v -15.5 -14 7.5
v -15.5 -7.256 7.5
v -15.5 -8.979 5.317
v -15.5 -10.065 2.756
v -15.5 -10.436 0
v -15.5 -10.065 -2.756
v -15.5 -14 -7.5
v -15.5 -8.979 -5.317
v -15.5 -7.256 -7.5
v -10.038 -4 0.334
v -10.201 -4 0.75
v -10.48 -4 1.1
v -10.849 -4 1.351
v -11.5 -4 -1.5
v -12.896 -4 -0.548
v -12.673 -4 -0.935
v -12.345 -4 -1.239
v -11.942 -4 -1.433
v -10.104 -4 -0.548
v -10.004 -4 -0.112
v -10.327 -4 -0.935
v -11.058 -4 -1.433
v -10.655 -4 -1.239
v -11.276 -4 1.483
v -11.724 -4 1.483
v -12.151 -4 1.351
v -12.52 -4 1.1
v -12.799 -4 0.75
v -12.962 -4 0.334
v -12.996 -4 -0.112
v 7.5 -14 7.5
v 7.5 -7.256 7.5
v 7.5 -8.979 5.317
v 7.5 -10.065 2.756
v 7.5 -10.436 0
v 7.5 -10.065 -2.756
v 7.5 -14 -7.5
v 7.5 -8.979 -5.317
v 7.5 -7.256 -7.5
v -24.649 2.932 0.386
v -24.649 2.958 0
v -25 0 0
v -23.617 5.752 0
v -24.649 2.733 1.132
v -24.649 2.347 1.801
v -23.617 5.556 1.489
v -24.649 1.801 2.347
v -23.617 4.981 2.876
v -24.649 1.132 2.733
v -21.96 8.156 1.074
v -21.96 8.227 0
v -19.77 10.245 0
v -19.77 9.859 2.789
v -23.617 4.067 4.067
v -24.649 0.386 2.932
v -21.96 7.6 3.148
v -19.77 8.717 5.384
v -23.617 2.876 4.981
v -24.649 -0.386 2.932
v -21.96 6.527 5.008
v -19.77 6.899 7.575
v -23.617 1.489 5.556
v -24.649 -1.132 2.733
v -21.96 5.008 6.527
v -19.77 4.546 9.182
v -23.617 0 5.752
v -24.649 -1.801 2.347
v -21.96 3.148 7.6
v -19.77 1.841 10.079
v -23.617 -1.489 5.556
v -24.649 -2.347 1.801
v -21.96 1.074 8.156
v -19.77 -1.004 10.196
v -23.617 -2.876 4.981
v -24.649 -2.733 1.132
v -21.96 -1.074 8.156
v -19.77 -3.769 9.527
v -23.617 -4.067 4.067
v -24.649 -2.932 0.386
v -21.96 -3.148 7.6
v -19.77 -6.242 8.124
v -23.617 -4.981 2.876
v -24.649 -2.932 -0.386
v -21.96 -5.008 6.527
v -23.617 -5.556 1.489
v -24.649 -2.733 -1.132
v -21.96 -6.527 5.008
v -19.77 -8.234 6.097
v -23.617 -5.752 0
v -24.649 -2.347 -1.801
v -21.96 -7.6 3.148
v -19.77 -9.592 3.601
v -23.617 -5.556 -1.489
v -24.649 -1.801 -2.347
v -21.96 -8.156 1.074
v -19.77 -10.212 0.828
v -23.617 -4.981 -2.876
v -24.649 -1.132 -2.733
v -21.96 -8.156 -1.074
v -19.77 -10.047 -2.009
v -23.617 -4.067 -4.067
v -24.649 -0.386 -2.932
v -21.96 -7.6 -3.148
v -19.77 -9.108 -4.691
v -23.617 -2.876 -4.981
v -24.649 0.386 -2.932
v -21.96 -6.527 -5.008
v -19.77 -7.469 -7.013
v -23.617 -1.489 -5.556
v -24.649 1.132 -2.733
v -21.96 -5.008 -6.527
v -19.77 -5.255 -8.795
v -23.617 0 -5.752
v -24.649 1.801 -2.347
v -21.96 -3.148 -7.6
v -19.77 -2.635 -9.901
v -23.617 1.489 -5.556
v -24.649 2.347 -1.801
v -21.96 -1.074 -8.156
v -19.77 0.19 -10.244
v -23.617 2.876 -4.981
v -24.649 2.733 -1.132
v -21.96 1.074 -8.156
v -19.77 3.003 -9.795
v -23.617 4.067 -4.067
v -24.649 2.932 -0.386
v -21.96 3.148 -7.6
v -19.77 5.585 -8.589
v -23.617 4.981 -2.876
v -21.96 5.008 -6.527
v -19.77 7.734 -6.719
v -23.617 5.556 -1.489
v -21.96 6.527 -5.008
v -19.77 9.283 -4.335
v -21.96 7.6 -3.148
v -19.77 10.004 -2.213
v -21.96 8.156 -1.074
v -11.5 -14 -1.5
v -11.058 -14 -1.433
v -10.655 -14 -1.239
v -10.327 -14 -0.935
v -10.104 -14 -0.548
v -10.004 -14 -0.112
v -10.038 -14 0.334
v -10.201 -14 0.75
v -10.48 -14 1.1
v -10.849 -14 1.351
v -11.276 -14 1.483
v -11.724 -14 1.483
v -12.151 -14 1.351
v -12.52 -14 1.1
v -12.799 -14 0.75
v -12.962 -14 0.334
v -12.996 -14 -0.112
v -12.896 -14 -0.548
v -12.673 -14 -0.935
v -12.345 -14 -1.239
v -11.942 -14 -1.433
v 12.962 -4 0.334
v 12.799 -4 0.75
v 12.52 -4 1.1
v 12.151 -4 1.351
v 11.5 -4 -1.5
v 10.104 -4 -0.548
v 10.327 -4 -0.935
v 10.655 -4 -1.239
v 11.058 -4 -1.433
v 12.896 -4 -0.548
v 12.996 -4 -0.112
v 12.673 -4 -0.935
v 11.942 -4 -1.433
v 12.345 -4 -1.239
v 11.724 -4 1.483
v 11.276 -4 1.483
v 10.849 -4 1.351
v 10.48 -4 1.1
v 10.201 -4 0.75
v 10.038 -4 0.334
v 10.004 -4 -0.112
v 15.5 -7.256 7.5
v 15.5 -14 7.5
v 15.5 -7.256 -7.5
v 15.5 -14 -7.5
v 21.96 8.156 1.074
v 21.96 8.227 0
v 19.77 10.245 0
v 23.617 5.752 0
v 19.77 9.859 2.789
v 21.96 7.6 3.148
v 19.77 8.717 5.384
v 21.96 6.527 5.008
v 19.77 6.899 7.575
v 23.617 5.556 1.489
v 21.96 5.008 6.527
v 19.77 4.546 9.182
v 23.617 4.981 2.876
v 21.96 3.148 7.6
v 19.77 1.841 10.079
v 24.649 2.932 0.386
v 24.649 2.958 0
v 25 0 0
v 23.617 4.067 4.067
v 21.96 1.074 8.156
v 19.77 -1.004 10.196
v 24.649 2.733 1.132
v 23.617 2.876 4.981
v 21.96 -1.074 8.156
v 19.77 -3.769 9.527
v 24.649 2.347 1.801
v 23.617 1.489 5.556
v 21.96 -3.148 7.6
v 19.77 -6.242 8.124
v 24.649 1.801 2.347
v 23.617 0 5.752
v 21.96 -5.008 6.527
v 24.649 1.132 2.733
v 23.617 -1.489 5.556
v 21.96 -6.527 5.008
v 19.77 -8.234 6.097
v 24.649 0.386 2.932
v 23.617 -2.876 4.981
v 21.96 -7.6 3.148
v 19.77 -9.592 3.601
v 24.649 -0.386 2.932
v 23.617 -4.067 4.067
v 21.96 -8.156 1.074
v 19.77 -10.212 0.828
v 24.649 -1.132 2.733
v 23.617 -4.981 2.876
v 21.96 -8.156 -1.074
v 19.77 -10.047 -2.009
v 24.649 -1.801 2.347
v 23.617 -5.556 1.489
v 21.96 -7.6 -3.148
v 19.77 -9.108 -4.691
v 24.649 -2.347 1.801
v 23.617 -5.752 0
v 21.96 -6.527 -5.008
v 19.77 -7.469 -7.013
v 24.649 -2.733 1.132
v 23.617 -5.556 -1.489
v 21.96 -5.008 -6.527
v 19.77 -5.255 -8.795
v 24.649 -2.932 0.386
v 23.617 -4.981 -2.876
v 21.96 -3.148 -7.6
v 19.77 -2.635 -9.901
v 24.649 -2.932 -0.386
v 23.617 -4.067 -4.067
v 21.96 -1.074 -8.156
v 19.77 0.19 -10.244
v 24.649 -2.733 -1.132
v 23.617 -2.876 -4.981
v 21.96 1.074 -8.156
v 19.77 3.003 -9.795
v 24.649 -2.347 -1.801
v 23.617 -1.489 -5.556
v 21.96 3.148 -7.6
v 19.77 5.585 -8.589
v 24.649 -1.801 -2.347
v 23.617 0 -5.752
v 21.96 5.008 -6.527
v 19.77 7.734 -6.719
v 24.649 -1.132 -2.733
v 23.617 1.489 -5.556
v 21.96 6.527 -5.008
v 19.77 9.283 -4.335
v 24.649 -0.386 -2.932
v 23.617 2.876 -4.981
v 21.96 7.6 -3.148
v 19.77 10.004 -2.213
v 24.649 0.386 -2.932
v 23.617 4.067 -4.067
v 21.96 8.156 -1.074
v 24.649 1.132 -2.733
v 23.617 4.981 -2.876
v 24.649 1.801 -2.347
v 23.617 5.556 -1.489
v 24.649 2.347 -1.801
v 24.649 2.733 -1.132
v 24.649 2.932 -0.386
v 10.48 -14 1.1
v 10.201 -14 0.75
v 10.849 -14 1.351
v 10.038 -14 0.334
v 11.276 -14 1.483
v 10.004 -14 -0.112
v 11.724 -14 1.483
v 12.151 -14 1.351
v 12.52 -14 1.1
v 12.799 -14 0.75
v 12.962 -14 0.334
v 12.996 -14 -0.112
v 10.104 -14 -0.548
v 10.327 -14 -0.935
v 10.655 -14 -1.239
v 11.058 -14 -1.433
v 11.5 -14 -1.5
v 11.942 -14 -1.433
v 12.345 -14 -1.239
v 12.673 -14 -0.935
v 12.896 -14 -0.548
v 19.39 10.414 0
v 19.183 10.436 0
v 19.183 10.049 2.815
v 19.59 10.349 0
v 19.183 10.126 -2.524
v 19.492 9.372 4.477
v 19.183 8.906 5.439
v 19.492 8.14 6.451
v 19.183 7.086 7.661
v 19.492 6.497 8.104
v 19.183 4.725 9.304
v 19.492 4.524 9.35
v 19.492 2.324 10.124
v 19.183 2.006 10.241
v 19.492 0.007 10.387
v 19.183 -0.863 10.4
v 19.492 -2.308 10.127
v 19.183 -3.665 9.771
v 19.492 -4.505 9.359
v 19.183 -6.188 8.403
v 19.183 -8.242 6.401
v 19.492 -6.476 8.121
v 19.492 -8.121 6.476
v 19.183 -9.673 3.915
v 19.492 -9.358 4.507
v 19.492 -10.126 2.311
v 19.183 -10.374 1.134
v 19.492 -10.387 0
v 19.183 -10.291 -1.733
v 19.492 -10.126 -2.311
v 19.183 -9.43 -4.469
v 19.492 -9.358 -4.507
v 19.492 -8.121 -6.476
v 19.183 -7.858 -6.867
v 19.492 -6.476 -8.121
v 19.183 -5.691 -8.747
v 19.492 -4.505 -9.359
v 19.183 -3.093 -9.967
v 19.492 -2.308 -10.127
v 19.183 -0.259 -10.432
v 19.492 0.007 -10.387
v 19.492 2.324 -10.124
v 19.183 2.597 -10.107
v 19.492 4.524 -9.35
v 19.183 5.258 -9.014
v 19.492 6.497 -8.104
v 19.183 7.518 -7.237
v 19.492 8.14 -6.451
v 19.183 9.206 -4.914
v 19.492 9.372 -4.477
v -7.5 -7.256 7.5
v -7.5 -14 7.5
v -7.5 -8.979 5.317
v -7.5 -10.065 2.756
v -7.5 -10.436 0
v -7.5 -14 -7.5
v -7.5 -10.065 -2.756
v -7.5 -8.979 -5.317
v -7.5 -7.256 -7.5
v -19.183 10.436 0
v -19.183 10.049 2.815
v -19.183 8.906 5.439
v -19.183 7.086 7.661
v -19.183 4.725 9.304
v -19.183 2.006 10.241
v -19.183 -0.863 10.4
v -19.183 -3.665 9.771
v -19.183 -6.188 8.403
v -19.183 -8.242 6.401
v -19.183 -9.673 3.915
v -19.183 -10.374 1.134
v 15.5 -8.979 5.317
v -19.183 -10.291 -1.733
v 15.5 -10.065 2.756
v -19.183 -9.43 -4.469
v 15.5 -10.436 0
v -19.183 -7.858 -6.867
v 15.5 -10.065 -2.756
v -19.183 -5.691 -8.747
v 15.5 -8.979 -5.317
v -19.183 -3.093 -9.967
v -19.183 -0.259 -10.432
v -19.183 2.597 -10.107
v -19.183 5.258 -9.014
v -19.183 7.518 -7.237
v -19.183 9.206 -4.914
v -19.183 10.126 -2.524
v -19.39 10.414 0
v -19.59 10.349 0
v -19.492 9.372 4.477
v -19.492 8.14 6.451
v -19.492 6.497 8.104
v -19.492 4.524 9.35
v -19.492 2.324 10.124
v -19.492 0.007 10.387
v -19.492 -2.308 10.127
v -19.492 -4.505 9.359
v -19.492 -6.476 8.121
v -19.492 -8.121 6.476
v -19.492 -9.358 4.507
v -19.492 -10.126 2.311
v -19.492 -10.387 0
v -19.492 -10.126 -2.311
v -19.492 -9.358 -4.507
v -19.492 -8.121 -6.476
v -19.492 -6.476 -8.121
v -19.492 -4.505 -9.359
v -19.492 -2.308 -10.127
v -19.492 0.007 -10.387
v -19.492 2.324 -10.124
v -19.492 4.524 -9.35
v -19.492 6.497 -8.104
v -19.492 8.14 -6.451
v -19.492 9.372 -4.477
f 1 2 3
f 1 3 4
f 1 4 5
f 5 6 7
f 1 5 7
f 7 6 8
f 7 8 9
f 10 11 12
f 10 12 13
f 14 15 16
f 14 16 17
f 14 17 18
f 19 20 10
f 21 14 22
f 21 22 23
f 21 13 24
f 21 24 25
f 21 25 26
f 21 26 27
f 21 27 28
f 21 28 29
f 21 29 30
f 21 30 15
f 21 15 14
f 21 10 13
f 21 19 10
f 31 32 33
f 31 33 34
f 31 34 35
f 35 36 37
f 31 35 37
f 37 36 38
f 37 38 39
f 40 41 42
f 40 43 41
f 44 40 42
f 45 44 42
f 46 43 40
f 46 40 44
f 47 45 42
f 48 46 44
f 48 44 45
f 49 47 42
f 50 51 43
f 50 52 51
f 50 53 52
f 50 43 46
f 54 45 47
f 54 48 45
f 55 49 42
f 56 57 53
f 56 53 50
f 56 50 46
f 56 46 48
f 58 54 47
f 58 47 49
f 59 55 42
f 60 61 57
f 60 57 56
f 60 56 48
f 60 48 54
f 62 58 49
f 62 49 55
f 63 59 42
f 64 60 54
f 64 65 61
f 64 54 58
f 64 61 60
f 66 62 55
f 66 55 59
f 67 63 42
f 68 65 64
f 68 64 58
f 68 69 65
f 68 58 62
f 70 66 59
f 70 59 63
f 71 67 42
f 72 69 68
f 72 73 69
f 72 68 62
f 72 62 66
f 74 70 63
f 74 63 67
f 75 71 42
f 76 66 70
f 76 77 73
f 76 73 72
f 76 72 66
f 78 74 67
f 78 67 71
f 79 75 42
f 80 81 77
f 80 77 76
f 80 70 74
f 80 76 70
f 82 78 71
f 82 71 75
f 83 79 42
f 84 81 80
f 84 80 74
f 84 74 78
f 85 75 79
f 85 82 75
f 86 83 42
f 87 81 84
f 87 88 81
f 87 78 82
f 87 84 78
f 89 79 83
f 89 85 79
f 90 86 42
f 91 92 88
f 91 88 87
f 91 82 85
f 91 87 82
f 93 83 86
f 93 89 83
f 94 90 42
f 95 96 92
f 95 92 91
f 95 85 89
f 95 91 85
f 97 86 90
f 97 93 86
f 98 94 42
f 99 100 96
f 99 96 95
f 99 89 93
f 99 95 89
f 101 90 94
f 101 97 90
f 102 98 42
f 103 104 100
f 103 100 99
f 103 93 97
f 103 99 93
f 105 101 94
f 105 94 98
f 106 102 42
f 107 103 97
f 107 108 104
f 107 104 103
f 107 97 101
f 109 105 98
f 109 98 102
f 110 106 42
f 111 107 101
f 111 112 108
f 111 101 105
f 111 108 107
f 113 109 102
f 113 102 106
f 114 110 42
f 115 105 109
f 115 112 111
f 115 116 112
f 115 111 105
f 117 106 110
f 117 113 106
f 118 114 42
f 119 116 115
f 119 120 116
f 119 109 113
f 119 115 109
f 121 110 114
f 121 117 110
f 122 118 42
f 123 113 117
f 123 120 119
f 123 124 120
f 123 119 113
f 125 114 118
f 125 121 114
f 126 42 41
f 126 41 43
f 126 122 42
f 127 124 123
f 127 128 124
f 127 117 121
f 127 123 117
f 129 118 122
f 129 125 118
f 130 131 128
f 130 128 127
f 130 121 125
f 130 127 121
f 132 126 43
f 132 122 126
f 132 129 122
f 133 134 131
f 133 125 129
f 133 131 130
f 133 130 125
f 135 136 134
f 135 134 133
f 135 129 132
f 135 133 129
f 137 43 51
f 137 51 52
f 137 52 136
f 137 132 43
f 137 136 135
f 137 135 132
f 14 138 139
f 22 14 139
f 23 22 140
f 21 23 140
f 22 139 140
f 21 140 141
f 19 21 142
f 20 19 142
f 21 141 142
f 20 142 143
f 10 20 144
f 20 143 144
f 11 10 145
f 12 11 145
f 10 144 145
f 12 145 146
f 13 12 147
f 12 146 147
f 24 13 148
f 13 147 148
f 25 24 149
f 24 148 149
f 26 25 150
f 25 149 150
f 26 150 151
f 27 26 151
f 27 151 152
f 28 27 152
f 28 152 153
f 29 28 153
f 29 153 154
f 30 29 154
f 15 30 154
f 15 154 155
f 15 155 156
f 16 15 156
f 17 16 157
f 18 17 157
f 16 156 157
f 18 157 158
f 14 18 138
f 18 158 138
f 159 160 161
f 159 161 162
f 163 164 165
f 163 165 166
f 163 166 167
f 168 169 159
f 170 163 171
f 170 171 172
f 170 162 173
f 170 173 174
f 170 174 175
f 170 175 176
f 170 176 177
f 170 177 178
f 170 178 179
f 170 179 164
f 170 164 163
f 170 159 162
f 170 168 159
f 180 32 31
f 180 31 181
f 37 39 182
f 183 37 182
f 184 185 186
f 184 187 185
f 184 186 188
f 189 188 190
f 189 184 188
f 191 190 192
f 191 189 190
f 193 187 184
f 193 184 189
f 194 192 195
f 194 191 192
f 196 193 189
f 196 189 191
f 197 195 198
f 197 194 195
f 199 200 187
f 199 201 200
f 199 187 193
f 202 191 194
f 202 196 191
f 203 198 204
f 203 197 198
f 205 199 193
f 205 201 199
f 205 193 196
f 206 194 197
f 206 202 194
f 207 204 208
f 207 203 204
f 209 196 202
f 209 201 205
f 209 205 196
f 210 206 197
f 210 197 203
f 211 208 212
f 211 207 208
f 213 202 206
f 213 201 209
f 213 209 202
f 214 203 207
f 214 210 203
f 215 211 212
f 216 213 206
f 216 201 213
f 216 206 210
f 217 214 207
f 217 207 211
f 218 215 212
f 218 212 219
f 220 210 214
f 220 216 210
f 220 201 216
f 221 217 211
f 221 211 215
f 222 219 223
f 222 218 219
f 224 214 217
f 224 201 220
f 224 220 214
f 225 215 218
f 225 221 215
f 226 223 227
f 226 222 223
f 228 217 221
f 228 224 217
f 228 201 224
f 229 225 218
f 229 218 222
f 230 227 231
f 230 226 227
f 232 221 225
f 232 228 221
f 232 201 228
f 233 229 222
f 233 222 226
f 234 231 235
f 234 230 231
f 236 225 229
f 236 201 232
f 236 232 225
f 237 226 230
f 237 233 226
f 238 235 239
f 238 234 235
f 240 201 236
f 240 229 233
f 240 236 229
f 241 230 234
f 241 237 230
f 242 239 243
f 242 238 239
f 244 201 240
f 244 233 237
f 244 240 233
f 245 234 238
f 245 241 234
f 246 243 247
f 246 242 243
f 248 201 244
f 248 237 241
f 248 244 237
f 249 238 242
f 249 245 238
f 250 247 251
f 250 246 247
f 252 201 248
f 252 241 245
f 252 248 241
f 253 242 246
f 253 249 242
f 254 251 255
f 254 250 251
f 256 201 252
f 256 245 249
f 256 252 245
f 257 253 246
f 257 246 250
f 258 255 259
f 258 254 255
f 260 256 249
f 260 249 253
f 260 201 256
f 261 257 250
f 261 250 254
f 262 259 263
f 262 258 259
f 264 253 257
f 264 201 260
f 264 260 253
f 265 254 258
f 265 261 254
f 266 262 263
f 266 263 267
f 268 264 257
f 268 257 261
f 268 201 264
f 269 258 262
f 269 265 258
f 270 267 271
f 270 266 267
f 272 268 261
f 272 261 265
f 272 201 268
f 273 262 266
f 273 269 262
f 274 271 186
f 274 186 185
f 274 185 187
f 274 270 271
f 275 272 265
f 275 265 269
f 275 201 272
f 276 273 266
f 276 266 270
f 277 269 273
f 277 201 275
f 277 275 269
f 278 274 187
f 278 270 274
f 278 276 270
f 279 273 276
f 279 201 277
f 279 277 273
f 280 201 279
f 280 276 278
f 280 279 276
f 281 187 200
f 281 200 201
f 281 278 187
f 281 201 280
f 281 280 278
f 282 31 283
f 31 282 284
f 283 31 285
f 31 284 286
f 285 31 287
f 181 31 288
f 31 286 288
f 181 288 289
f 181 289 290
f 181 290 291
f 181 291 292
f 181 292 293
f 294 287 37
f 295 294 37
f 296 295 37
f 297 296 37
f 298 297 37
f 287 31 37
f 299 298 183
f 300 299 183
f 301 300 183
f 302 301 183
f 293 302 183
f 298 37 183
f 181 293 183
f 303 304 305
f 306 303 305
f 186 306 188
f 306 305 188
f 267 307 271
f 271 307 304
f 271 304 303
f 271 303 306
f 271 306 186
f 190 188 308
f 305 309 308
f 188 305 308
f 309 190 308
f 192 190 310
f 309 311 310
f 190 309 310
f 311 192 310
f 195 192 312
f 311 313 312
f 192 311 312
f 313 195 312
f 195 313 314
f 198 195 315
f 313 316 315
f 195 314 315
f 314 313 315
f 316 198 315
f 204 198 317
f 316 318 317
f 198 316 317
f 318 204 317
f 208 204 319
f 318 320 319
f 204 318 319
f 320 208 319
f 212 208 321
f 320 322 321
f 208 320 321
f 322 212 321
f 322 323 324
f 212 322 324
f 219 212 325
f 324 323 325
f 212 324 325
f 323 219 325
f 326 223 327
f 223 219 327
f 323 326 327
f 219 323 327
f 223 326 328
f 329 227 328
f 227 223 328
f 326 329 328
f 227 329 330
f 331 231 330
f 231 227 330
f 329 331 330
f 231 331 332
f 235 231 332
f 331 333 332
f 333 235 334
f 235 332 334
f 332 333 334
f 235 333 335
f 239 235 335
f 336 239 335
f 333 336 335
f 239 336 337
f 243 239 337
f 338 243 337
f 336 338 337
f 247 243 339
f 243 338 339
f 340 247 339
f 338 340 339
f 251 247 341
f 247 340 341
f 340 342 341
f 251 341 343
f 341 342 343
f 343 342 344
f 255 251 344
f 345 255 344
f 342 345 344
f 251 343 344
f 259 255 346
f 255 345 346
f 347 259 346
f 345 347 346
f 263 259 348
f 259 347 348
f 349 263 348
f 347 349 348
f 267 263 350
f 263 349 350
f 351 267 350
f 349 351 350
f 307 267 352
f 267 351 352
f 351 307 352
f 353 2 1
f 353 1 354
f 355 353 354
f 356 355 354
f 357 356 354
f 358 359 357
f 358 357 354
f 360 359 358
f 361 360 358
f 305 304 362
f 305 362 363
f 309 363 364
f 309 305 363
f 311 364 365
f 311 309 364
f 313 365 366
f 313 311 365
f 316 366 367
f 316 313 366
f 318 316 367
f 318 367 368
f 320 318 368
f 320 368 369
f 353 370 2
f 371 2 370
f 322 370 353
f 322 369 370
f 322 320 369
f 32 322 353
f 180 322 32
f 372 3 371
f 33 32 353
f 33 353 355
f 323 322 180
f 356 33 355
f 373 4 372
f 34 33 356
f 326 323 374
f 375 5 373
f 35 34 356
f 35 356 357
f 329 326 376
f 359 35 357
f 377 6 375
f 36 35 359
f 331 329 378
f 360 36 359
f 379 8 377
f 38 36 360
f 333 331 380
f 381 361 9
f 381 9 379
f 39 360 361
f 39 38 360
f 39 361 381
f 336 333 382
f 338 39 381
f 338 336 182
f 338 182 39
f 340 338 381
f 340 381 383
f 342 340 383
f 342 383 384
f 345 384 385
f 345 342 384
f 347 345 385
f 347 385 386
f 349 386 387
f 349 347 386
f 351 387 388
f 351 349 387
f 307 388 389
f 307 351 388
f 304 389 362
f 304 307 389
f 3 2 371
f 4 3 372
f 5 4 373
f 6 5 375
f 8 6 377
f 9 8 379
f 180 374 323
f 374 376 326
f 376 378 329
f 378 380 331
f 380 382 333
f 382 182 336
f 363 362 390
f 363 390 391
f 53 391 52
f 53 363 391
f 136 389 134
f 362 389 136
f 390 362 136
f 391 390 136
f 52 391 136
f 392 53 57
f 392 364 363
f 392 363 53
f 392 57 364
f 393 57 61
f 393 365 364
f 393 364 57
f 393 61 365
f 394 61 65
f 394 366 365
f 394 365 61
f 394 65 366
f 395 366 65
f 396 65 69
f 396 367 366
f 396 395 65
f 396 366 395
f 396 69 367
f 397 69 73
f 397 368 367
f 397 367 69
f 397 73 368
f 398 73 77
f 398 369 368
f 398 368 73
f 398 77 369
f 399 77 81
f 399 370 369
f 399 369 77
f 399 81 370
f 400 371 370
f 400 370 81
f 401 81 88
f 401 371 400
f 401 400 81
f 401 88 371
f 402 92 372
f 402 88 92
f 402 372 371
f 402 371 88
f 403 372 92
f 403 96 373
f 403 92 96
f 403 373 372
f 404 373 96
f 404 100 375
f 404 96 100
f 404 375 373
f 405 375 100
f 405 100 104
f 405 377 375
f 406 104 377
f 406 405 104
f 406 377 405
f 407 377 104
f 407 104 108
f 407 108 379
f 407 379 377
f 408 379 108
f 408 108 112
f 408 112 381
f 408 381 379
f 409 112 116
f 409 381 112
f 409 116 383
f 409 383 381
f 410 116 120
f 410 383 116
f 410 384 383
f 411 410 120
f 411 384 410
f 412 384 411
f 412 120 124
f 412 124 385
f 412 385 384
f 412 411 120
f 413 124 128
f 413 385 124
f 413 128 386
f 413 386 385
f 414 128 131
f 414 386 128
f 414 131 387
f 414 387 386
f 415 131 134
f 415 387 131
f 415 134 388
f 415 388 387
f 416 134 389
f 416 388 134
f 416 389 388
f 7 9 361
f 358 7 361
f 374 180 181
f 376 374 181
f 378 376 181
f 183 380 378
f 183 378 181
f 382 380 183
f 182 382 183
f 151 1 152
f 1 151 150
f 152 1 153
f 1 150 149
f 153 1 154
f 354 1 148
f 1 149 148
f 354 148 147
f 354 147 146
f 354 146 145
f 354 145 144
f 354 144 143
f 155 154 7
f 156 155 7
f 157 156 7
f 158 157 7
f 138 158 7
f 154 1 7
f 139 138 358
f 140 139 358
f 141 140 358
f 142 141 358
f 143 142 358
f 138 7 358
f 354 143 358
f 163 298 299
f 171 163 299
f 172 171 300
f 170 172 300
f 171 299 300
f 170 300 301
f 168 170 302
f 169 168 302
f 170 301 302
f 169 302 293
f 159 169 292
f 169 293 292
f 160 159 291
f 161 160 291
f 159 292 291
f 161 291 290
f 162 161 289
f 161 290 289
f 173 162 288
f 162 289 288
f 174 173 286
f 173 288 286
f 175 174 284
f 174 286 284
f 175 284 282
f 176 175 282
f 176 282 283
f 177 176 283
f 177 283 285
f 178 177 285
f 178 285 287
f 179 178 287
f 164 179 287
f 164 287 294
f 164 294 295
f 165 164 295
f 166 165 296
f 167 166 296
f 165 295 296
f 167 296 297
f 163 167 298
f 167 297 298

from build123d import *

# Parameters (mm, degrees)
SKETCH_3_W          = 8
SKETCH_3_H          = 15
EXTRUDE_1_DEPTH     = 14
SKETCH_4_R          = 1.5
CUT_EXTRUDE_1_DEPTH = 10
FILLET_1_R          = 1


with BuildPart() as part:
    # ｽｹｯﾁ1 → 回転2 (revolve)
    with BuildSketch(Plane.XY):
        with BuildLine():
            Line((-19.5, 10.435516279), (19.5, 10.435516279))
            ThreePointArc((19.5, 10.435516279), (23.540844472, 5.898092912), (25, 0))
            Line((25, 0), (-25, 0))
            ThreePointArc((-25, 0), (-23.540844472, 5.898092912), (-19.5, 10.435516279))
        make_face()
    revolve(axis=Axis((-19.5, 0, 0), (1, 0, 0)))

    # ｽｹｯﾁ3 → ﾎﾞｽ - 押し出し1 (add)
    with BuildSketch(Plane(origin=(0, 0, 0), x_dir=(1, 0, 0), z_dir=(0, 1, 0))):
        with Locations((-11.5, 0)):
            Rectangle(SKETCH_3_W, SKETCH_3_H)
        with Locations((11.5, 0)):
            Rectangle(SKETCH_3_W, SKETCH_3_H)
    extrude(amount=-EXTRUDE_1_DEPTH)

    # ｽｹｯﾁ4 → ｶｯﾄ - 押し出し1 (cut)
    with BuildSketch(Plane(origin=(0, -14, 0), x_dir=(-1, 0, 0), z_dir=(0, -1, 0))):
        with Locations(Location((-11.5, 0, 0), (0, 0, 90))):
            Circle(SKETCH_4_R)
        with Locations(Location((11.5, 0, 0), (0, 0, 90))):
            Circle(SKETCH_4_R)
    extrude(amount=-CUT_EXTRUDE_1_DEPTH, mode=Mode.SUBTRACT)

    # ﾌｨﾚｯﾄ1
    fillet_1_edges = [part.edges().sort_by_distance(p)[0] for p in [
        (-19.5, -10.435516279, 0),
        (19.5, -10.435516279, 0),
    ]]
    fillet(fillet_1_edges, radius=FILLET_1_R)


solid = part.part
